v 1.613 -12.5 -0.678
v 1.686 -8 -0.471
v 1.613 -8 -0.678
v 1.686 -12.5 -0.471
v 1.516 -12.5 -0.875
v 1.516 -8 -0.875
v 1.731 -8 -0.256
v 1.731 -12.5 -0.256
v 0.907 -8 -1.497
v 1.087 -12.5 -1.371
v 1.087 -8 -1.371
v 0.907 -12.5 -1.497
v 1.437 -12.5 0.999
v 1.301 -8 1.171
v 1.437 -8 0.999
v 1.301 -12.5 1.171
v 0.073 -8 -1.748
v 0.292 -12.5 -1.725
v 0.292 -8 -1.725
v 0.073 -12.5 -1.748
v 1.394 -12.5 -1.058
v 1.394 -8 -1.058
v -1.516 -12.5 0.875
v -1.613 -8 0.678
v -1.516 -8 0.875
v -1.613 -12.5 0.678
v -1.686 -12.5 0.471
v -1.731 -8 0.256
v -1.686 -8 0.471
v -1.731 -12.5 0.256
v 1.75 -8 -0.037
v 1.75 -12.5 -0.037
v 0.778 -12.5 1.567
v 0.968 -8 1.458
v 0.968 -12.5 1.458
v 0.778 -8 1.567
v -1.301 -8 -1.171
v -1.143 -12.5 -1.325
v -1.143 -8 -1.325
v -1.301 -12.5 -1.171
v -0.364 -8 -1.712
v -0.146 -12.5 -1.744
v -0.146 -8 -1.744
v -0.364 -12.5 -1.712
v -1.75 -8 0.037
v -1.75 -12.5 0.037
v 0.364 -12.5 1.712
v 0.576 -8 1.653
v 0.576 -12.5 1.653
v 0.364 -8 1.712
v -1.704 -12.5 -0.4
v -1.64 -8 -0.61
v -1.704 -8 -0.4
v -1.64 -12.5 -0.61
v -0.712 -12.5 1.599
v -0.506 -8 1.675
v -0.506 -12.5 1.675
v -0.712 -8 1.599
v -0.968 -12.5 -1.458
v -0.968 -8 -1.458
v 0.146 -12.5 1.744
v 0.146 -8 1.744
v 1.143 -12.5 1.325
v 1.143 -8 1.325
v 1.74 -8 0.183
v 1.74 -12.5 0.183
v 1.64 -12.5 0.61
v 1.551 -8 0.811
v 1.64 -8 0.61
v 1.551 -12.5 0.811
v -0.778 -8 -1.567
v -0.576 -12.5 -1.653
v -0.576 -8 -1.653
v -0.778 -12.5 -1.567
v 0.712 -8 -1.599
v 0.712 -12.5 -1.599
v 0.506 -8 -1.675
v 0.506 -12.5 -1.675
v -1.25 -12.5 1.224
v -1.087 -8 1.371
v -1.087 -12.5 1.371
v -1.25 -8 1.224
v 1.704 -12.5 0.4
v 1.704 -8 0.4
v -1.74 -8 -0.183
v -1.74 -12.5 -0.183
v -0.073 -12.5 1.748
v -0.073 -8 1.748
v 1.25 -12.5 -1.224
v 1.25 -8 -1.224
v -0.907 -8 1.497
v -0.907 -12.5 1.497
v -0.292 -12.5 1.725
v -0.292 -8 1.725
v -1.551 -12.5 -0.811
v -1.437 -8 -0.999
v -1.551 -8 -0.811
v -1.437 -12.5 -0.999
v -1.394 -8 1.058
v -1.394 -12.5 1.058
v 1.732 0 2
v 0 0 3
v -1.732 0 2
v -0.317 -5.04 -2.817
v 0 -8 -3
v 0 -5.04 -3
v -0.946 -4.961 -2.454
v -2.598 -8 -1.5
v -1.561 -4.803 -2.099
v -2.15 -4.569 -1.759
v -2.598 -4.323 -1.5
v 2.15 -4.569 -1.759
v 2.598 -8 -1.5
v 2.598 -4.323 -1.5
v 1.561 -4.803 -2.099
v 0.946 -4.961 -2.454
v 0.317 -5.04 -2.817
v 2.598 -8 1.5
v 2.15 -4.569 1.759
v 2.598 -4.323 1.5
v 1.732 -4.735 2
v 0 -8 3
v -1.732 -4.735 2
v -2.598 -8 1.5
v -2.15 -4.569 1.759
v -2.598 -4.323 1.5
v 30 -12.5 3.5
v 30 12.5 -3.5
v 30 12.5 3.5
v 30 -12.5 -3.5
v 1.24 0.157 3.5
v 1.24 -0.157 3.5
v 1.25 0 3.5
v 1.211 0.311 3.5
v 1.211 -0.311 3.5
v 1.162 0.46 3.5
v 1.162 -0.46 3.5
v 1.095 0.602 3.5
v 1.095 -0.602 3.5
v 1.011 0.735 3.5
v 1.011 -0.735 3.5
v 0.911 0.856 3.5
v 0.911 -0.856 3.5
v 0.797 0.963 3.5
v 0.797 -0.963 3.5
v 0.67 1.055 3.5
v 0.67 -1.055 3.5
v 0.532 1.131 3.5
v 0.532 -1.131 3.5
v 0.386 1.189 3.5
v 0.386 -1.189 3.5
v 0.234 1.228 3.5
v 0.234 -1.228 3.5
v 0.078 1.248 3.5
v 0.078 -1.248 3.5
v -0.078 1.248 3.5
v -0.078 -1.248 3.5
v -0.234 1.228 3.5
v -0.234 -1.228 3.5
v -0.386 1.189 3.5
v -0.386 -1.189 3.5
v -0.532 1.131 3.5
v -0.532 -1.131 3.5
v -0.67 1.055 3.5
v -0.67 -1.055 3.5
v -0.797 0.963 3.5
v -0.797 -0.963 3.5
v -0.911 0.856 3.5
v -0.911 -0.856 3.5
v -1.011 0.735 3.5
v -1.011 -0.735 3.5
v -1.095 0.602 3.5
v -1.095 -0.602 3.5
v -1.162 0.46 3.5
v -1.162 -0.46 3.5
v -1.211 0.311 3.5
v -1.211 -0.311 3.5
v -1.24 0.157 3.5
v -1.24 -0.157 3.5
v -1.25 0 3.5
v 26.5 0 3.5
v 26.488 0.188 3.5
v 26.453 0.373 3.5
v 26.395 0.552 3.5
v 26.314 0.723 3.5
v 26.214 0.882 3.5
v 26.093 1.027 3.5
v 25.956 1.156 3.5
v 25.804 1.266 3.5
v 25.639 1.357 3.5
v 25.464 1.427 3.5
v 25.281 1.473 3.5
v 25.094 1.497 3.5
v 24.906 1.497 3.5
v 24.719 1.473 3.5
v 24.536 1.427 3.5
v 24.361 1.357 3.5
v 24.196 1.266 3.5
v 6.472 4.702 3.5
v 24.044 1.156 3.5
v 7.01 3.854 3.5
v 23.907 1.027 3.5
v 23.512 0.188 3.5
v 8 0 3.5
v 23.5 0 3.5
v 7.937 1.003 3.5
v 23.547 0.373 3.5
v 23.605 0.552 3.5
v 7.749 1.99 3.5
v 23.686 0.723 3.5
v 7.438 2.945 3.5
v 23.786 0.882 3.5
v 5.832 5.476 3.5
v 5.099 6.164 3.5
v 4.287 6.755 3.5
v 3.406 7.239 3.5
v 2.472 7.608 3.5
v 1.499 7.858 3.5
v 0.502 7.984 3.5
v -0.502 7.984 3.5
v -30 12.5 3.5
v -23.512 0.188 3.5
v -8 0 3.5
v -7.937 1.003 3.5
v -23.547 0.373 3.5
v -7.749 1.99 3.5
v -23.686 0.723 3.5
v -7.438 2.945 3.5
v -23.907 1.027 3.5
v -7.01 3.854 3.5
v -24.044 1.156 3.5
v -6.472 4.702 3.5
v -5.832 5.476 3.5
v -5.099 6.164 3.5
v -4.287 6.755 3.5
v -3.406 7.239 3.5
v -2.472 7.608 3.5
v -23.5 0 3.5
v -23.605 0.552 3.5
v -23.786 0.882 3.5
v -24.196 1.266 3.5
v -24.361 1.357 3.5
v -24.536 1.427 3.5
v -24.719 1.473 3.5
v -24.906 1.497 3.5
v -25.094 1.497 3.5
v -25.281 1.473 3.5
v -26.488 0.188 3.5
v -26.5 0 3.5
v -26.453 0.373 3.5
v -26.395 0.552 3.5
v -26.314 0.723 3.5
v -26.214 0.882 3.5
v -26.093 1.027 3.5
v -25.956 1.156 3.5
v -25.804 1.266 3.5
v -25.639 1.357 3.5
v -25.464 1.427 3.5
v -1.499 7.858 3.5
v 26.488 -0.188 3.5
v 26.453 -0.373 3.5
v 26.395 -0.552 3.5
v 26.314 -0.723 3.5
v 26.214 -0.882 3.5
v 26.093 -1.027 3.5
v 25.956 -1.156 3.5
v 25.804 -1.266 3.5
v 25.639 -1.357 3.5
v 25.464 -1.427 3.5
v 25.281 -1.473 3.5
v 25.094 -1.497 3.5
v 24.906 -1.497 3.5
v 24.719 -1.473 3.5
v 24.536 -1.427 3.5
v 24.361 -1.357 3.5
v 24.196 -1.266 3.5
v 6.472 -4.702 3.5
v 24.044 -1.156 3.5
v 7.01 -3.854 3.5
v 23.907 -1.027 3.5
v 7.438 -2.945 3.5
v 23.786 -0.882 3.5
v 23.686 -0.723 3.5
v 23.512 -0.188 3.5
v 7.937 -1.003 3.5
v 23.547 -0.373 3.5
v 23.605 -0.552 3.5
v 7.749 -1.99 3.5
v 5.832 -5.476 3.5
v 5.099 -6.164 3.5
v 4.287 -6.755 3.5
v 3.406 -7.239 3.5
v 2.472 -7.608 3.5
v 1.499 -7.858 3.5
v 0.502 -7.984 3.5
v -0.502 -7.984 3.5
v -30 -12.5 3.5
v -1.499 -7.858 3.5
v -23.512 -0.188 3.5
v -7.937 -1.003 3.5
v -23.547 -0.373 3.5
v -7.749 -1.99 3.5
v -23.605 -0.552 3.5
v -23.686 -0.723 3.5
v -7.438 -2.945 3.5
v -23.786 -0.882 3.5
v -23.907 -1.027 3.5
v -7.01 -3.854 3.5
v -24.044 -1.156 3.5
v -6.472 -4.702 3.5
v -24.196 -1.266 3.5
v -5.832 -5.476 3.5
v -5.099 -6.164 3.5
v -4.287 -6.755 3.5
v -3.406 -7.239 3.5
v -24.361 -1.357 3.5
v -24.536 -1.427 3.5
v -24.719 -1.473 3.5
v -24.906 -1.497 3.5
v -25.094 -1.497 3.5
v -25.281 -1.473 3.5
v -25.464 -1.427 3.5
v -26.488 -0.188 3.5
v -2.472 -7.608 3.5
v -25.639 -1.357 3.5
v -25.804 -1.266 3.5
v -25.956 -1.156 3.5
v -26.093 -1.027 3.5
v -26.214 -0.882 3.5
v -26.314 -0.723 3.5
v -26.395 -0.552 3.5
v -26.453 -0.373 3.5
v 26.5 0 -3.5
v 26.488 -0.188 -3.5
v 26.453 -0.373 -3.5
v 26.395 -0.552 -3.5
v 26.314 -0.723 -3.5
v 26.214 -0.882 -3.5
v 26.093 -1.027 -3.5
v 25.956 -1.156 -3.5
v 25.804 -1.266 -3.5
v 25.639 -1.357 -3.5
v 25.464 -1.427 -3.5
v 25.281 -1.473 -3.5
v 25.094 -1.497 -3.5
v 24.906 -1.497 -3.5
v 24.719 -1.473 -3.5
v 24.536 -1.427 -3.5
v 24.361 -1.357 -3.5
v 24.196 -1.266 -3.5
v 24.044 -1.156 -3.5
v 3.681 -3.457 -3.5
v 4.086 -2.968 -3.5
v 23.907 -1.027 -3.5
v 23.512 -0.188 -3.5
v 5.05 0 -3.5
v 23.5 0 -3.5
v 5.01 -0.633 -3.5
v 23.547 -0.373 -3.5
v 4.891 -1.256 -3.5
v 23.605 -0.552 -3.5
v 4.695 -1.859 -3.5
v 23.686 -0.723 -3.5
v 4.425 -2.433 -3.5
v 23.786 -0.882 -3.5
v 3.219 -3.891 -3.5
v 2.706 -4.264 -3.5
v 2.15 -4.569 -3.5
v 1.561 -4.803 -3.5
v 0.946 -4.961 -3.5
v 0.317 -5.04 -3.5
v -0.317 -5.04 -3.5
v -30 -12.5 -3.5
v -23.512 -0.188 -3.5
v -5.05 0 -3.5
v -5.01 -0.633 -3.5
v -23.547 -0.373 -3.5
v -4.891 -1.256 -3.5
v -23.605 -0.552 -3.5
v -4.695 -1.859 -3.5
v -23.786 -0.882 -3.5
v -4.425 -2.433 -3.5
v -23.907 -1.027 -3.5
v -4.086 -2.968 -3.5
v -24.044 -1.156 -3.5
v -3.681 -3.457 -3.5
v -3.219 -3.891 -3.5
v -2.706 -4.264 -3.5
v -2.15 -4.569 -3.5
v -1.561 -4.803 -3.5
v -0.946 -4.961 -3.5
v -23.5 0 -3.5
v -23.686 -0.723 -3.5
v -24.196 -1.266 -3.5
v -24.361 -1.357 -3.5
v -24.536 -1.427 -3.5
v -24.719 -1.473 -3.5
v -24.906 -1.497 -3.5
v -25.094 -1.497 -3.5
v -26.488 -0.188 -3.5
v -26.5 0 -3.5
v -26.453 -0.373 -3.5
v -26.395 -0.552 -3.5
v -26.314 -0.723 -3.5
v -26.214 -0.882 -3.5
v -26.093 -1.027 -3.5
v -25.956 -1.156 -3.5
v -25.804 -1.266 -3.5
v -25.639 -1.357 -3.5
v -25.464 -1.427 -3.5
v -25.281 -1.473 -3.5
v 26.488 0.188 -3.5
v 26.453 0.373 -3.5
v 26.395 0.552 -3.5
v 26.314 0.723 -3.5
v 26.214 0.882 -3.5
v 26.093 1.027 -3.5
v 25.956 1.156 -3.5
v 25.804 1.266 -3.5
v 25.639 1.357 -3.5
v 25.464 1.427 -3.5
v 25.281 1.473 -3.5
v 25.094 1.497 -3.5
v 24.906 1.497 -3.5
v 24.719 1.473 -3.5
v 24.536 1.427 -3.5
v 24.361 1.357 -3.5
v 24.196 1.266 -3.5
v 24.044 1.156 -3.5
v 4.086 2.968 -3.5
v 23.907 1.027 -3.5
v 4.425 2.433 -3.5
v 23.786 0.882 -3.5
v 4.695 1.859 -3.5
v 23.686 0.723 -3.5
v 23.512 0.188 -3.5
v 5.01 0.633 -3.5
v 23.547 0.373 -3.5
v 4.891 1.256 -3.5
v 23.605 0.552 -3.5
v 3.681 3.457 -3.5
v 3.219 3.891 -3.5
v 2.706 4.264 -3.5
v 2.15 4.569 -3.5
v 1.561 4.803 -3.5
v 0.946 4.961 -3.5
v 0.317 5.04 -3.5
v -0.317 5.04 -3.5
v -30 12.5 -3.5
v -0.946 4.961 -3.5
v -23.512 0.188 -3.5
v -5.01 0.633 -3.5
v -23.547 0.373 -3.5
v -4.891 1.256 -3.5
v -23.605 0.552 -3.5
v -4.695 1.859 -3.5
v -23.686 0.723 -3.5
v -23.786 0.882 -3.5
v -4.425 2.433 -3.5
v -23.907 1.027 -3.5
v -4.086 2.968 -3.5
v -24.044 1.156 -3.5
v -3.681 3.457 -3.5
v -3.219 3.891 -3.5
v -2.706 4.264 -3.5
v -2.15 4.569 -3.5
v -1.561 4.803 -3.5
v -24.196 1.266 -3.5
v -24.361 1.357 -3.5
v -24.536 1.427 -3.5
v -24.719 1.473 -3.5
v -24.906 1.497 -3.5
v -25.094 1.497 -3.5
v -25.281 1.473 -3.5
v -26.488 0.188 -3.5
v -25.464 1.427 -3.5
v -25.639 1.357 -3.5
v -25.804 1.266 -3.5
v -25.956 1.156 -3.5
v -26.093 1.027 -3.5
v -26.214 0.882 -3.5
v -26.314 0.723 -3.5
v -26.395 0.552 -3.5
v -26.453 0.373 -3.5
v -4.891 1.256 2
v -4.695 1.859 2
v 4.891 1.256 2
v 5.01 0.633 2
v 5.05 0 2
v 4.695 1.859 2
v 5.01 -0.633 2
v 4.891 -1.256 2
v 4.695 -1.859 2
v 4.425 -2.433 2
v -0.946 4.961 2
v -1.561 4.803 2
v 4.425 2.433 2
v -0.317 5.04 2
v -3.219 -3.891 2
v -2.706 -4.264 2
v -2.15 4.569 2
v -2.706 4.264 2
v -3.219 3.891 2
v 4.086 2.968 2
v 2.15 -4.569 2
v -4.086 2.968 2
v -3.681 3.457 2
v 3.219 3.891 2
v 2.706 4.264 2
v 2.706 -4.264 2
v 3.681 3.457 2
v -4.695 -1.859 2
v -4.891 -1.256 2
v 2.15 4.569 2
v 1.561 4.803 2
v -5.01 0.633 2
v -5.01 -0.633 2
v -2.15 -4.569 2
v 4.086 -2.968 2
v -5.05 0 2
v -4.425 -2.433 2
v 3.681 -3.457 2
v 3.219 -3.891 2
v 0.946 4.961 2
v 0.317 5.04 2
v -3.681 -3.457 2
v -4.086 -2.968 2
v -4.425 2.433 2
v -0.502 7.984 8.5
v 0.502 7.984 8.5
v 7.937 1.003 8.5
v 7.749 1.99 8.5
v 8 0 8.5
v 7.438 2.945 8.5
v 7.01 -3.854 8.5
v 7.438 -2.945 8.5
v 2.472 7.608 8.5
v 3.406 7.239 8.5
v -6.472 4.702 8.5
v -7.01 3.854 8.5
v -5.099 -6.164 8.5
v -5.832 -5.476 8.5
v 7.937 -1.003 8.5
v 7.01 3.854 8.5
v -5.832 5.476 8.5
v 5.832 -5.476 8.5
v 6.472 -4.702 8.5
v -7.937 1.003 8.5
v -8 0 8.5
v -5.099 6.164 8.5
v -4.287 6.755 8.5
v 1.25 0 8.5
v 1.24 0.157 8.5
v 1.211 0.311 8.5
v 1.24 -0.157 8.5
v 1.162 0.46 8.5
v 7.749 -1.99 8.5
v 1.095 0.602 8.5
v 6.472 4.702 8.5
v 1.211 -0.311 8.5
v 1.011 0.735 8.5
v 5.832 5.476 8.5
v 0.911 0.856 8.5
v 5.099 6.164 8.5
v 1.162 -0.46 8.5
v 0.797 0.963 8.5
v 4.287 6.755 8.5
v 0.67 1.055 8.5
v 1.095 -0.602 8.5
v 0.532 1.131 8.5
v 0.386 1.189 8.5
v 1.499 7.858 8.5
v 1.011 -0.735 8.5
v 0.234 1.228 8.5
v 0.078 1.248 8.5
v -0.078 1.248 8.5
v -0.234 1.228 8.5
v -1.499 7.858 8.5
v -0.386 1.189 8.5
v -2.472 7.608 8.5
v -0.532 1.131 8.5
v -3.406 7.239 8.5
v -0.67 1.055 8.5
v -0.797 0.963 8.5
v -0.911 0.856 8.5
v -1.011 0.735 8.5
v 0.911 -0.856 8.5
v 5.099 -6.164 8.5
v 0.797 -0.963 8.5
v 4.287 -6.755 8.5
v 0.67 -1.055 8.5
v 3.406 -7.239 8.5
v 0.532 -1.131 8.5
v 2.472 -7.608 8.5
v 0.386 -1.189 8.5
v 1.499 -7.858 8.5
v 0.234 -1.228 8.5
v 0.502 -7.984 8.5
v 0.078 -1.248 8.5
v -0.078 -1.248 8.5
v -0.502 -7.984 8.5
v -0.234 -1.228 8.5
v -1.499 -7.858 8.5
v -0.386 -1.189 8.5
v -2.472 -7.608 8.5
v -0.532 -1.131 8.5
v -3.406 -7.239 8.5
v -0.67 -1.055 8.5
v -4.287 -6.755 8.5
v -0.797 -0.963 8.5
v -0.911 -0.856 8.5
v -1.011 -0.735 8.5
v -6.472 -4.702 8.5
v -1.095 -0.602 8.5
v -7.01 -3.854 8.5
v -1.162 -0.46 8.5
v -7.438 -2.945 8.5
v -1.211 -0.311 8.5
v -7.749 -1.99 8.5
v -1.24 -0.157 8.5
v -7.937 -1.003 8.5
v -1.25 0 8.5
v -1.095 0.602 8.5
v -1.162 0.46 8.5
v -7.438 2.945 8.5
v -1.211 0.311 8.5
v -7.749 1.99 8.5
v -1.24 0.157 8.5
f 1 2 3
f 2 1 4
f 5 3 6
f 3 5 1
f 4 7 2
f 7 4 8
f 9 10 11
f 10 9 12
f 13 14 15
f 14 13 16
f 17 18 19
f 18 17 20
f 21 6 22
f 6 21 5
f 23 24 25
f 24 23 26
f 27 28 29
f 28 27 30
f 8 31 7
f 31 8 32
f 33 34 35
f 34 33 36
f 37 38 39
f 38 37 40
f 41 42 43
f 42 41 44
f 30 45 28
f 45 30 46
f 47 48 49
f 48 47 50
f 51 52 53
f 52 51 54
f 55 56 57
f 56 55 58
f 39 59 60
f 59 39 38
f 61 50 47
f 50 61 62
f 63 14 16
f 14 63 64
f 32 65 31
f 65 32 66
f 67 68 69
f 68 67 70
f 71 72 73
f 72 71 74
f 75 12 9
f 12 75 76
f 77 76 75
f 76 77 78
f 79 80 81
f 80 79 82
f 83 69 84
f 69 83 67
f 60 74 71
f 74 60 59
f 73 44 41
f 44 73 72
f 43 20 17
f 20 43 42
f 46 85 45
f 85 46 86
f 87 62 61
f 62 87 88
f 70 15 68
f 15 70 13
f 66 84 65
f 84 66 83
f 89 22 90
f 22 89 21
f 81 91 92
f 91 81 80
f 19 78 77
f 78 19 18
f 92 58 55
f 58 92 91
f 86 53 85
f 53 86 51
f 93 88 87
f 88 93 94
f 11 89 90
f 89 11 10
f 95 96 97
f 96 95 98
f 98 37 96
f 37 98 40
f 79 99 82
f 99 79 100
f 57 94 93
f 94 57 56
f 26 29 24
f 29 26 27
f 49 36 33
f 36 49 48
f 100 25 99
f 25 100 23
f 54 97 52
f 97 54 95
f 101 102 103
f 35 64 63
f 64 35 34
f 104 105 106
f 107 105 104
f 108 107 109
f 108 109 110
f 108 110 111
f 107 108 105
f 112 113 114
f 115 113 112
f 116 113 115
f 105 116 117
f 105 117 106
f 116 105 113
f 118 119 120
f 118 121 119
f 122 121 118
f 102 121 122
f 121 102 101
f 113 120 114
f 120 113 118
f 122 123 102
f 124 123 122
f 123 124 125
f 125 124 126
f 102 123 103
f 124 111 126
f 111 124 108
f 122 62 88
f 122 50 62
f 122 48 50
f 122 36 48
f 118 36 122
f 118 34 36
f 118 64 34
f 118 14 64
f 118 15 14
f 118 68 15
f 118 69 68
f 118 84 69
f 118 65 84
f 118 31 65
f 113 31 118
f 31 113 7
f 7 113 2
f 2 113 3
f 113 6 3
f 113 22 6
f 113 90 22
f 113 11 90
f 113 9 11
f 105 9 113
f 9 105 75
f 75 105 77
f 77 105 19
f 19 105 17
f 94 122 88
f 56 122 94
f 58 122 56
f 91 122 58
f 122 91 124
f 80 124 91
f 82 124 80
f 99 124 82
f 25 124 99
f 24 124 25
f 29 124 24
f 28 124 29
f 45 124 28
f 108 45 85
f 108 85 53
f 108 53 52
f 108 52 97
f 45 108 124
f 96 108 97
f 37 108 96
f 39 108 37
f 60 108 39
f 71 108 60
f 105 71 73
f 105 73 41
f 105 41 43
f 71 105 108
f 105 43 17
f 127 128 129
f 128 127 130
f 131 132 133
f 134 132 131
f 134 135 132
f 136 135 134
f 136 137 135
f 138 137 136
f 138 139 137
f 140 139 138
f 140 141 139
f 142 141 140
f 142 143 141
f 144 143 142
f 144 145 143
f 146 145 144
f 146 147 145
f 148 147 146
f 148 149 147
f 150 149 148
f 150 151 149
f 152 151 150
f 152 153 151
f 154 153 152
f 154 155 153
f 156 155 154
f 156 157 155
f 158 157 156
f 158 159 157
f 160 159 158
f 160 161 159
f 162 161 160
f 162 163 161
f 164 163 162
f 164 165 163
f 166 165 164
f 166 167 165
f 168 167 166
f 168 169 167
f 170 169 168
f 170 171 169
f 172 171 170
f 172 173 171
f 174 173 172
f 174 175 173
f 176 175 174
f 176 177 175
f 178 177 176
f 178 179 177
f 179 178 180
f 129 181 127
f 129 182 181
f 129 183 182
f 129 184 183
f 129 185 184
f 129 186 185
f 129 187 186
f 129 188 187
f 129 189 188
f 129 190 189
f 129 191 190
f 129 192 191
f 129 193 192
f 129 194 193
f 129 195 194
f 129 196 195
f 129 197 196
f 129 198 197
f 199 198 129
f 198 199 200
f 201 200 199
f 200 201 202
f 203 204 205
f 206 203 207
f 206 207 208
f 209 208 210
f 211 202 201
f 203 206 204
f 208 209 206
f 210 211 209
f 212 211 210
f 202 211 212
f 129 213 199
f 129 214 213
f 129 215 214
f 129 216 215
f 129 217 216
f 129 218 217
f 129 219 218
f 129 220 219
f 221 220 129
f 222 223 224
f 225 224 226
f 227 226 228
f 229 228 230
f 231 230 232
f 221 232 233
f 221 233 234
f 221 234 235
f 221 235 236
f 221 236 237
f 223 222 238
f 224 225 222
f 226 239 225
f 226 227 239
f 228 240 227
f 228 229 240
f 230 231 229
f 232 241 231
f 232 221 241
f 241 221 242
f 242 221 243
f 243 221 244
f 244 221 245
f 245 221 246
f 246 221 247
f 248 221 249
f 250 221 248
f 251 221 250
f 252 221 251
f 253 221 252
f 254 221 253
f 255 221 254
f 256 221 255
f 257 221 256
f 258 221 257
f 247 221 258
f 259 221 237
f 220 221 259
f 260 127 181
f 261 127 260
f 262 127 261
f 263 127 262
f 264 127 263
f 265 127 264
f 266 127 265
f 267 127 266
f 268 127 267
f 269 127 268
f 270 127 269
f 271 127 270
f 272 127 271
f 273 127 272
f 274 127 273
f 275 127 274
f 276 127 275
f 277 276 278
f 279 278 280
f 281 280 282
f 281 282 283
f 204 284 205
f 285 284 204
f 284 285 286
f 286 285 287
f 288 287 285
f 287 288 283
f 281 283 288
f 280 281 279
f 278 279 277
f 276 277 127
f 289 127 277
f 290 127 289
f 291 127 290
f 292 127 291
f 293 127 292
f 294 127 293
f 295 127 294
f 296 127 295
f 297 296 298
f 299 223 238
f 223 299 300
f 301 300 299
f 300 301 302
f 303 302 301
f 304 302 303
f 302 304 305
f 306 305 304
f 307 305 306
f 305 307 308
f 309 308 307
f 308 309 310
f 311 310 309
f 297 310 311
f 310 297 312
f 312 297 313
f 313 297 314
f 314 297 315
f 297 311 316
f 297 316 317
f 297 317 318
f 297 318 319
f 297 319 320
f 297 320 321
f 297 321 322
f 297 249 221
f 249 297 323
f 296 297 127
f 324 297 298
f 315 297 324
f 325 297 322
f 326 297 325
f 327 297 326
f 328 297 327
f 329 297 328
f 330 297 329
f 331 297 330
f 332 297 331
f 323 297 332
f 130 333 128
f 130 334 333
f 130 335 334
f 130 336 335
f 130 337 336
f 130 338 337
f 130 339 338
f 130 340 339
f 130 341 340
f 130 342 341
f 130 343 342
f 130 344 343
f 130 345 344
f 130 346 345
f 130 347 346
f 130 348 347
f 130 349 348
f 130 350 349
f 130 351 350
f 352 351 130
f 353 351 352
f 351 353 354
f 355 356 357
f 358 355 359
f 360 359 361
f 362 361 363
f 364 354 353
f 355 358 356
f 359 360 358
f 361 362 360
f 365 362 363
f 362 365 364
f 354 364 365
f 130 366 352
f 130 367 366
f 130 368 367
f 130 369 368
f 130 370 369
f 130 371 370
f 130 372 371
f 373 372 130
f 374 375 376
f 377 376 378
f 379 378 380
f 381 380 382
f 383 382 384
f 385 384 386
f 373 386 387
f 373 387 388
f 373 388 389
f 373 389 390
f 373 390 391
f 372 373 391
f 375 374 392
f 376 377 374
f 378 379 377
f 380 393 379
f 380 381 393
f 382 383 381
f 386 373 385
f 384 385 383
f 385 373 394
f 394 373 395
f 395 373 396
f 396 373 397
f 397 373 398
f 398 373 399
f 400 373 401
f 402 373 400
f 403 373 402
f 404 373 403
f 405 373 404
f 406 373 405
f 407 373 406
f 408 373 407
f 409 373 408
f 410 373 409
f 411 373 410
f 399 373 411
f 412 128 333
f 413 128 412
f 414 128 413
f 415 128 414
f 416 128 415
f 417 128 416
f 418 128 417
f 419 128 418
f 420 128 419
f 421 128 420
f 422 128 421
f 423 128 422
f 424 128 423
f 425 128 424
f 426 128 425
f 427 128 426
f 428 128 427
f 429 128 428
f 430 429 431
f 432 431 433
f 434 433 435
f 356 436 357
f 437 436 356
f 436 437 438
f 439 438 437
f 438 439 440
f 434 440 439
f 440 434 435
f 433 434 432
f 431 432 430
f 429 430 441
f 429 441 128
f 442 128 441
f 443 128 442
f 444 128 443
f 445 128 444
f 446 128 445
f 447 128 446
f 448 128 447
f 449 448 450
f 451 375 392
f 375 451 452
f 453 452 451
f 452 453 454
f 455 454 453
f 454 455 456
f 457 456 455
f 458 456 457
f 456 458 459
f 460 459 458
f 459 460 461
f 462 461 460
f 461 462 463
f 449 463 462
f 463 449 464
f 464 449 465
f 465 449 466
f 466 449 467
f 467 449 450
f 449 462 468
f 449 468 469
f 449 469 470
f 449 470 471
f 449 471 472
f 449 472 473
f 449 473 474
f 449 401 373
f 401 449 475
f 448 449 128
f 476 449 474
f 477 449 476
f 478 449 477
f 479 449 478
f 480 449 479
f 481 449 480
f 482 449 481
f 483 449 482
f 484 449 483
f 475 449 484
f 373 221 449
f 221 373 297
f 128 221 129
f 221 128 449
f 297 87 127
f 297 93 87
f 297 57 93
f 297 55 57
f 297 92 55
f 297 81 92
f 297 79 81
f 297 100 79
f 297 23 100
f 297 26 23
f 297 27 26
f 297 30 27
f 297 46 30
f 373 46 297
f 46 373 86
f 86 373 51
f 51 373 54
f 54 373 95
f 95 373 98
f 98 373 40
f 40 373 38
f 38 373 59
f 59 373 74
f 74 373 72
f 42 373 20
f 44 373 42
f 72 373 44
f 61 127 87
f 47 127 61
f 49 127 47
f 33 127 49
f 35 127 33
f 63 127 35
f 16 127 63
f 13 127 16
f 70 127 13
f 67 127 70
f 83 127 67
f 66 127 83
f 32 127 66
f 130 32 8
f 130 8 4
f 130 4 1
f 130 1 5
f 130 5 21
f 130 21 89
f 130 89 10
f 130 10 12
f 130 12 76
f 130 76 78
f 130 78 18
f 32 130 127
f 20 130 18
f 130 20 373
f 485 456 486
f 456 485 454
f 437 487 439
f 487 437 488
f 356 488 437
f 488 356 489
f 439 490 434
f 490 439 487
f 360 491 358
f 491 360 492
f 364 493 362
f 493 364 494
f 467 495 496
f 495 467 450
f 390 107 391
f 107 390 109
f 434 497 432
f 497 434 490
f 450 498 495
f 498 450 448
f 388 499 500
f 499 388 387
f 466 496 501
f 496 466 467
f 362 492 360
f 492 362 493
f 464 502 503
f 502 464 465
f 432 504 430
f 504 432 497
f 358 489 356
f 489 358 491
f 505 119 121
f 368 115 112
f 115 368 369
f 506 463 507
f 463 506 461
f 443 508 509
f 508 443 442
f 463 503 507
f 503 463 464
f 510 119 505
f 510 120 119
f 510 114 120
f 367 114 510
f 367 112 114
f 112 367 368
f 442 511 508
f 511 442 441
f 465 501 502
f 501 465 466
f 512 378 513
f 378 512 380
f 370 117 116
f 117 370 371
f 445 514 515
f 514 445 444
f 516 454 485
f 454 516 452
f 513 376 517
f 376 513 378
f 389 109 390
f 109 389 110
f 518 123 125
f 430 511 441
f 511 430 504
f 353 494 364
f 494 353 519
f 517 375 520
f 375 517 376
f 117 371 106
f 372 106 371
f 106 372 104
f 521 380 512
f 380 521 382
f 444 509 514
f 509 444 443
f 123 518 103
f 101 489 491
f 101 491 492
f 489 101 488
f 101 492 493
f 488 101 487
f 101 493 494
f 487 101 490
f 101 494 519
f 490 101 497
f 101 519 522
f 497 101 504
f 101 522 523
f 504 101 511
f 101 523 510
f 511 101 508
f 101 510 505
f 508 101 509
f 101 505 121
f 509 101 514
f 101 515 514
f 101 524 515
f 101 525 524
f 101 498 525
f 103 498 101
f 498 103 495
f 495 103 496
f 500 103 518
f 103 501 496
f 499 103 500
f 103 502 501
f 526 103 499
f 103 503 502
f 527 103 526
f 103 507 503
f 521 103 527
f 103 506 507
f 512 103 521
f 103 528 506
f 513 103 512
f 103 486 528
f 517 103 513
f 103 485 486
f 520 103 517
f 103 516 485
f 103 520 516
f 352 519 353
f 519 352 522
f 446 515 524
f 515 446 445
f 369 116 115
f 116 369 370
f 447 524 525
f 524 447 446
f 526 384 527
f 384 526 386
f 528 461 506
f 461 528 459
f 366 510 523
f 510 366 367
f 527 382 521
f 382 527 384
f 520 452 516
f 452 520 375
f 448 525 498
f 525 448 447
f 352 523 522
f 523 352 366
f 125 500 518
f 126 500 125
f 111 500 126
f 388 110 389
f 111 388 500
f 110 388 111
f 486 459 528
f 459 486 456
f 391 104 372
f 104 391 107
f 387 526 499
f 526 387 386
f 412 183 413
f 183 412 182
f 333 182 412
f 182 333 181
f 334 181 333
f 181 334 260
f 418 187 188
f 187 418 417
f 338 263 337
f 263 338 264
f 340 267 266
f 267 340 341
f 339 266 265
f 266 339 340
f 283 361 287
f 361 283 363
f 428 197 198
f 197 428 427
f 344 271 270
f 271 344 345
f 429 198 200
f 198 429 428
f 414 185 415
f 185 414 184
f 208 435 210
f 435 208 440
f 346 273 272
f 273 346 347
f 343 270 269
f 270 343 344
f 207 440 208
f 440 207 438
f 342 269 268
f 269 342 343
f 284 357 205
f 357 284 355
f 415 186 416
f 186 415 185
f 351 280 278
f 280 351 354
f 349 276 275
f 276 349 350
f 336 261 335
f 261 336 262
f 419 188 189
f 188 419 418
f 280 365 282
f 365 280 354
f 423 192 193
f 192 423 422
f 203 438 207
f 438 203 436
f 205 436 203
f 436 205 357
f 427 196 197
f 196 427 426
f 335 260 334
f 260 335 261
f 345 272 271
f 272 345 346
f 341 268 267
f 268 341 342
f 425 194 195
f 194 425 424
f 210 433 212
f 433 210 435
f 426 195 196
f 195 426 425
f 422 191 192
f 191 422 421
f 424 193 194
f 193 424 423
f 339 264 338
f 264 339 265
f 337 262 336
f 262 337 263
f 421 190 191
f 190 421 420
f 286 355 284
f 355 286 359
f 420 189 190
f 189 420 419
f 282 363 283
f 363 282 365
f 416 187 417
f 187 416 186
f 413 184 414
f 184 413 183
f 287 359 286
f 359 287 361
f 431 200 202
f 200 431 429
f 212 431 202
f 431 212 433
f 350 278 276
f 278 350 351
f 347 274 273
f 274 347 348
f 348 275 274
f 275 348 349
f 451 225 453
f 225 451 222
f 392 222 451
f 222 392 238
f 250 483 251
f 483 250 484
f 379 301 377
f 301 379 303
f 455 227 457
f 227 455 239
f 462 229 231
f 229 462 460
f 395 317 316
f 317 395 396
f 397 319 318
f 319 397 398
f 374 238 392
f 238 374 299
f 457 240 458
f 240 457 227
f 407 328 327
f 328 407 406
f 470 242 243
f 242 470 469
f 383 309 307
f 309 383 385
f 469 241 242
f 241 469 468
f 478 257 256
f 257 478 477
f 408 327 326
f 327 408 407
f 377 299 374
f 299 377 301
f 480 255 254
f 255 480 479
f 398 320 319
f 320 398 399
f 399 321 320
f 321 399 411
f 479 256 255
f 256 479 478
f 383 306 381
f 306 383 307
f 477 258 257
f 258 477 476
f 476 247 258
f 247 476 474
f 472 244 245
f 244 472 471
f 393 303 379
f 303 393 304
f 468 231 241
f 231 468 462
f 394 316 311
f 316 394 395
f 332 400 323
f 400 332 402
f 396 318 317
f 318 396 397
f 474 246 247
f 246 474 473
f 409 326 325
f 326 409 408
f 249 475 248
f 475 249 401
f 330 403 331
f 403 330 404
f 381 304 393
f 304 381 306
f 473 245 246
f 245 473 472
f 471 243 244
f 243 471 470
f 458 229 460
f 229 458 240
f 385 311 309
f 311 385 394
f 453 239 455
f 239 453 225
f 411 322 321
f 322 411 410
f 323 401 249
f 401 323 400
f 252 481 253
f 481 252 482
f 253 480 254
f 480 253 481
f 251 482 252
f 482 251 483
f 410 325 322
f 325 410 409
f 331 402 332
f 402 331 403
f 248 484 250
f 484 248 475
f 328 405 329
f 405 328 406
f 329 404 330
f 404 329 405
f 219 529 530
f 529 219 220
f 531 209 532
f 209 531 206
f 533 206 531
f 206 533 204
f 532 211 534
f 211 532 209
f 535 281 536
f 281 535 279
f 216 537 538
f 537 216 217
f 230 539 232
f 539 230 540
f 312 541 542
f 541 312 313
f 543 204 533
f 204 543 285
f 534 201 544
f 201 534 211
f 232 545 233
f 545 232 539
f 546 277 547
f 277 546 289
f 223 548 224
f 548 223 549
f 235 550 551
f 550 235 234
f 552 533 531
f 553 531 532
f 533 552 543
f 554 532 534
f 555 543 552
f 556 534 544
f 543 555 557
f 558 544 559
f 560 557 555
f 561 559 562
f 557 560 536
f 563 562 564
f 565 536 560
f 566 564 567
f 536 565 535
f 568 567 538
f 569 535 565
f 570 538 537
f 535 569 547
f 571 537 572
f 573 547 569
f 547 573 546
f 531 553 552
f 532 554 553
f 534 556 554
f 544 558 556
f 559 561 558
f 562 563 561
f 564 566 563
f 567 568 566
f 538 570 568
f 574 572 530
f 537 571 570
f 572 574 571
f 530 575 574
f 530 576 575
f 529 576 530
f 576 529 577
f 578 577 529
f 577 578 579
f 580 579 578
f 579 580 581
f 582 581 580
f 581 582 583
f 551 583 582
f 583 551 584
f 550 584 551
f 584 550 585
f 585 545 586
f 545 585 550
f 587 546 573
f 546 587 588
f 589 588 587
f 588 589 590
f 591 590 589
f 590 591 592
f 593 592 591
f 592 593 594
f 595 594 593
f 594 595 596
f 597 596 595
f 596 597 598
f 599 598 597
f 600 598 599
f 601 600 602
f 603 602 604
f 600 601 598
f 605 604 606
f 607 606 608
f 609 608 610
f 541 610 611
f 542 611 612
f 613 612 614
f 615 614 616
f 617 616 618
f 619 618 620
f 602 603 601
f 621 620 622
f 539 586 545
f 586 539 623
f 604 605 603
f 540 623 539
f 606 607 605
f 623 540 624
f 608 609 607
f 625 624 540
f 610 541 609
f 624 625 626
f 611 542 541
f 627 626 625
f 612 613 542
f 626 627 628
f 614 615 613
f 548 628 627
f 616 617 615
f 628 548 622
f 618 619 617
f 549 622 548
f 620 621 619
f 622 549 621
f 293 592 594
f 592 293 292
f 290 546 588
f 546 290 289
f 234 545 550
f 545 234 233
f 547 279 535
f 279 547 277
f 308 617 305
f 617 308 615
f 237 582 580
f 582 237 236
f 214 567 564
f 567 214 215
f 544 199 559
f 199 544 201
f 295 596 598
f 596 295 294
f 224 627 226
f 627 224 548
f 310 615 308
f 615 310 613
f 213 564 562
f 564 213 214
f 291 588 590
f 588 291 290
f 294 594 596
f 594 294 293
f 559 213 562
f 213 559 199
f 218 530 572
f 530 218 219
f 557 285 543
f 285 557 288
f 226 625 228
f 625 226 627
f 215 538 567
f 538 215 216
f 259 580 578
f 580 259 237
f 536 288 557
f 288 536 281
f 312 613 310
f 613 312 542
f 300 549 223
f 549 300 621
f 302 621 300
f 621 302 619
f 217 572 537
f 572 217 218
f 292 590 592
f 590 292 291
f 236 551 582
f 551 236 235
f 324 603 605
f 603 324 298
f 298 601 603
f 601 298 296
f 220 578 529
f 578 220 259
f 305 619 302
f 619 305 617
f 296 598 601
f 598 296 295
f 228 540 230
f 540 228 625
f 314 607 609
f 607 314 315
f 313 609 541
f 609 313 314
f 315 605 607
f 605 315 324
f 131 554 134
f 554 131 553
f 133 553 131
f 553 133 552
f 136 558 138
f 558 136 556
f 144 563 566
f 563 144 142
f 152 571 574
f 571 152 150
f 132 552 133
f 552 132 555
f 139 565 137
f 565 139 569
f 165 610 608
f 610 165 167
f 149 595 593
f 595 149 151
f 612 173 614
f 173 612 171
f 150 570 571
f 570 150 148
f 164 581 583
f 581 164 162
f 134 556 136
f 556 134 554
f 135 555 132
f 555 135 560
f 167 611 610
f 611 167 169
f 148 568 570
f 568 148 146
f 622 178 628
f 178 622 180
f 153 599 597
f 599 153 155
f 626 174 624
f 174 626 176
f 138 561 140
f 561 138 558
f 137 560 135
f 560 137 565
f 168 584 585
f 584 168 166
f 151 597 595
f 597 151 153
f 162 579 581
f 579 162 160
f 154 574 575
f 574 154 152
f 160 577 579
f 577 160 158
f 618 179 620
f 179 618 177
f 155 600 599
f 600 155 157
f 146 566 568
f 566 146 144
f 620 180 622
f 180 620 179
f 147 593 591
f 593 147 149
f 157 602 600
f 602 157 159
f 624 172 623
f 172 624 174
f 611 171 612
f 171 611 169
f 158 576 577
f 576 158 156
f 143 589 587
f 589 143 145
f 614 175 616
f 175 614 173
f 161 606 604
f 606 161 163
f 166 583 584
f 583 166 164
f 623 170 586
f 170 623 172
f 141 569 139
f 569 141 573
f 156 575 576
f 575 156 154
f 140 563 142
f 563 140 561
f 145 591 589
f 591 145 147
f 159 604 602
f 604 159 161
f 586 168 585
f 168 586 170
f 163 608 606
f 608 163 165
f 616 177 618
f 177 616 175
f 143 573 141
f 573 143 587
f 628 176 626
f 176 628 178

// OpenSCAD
// Greg's Wade reloaded - Guidler, Tilt Screws, Fishbone Gears
//mod (c)g3org bowden universal adapter for normal fittings like M10



//manigofset
manigofset=0.1;

// screw distance
screwdist=50;

//dinameter monting screw
mounting_screw=3;

//lenght
mount_length=60;

//width
mount_width=25;

//Material thickness
thickness=7;


//fittingdiameter M10? 
fittingdiameter=10.1;
fitting_screw_deep=5.5;



//hotend_diameter  only the value
hotend_diameter=16;

// hotend_thickness only the value
hotend_thickness=5;

//filament hole
filament_hole=2.5;


$fn=50*1;

// Plate

module plate();{
	difference(){
		cube([mount_length,mount_width,thickness],center=true);
		translate([0,0,-thickness/2])	cylinder(h = fitting_screw_deep, r=fittingdiameter/2);



//Bohrung1	
		translate([screwdist/2,0,0])		cylinder(h = thickness+manigofset, r=mounting_screw/2,center=true);
//Bohrung2
		translate([-screwdist/2,0,0])		cylinder(h = thickness+manigofset, r=mounting_screw/2,center=true);

//		translate([0,0,0])		cylinder(h = thickness+hotend_thickness+manigofset, r=fittingdiameter/2,center=true);

		rotate([90,30,0]){
			translate([0,0,0]){	
					cylinder(h = mount_width/2+manigofset, r=1.75);
					cylinder($fn = 6,h=8,r=3);
			}
		}
	}
}

module fittingmount();{
	difference(){
//wade extruder diameter
		translate([0,0,thickness/2])		cylinder(h = hotend_thickness, r=hotend_diameter/2);
//fitting diameter
		translate([0,0,thickness/2]){
			cylinder(h = hotend_thickness+thickness, r=filament_hole/2);
		}
		
	}
}
